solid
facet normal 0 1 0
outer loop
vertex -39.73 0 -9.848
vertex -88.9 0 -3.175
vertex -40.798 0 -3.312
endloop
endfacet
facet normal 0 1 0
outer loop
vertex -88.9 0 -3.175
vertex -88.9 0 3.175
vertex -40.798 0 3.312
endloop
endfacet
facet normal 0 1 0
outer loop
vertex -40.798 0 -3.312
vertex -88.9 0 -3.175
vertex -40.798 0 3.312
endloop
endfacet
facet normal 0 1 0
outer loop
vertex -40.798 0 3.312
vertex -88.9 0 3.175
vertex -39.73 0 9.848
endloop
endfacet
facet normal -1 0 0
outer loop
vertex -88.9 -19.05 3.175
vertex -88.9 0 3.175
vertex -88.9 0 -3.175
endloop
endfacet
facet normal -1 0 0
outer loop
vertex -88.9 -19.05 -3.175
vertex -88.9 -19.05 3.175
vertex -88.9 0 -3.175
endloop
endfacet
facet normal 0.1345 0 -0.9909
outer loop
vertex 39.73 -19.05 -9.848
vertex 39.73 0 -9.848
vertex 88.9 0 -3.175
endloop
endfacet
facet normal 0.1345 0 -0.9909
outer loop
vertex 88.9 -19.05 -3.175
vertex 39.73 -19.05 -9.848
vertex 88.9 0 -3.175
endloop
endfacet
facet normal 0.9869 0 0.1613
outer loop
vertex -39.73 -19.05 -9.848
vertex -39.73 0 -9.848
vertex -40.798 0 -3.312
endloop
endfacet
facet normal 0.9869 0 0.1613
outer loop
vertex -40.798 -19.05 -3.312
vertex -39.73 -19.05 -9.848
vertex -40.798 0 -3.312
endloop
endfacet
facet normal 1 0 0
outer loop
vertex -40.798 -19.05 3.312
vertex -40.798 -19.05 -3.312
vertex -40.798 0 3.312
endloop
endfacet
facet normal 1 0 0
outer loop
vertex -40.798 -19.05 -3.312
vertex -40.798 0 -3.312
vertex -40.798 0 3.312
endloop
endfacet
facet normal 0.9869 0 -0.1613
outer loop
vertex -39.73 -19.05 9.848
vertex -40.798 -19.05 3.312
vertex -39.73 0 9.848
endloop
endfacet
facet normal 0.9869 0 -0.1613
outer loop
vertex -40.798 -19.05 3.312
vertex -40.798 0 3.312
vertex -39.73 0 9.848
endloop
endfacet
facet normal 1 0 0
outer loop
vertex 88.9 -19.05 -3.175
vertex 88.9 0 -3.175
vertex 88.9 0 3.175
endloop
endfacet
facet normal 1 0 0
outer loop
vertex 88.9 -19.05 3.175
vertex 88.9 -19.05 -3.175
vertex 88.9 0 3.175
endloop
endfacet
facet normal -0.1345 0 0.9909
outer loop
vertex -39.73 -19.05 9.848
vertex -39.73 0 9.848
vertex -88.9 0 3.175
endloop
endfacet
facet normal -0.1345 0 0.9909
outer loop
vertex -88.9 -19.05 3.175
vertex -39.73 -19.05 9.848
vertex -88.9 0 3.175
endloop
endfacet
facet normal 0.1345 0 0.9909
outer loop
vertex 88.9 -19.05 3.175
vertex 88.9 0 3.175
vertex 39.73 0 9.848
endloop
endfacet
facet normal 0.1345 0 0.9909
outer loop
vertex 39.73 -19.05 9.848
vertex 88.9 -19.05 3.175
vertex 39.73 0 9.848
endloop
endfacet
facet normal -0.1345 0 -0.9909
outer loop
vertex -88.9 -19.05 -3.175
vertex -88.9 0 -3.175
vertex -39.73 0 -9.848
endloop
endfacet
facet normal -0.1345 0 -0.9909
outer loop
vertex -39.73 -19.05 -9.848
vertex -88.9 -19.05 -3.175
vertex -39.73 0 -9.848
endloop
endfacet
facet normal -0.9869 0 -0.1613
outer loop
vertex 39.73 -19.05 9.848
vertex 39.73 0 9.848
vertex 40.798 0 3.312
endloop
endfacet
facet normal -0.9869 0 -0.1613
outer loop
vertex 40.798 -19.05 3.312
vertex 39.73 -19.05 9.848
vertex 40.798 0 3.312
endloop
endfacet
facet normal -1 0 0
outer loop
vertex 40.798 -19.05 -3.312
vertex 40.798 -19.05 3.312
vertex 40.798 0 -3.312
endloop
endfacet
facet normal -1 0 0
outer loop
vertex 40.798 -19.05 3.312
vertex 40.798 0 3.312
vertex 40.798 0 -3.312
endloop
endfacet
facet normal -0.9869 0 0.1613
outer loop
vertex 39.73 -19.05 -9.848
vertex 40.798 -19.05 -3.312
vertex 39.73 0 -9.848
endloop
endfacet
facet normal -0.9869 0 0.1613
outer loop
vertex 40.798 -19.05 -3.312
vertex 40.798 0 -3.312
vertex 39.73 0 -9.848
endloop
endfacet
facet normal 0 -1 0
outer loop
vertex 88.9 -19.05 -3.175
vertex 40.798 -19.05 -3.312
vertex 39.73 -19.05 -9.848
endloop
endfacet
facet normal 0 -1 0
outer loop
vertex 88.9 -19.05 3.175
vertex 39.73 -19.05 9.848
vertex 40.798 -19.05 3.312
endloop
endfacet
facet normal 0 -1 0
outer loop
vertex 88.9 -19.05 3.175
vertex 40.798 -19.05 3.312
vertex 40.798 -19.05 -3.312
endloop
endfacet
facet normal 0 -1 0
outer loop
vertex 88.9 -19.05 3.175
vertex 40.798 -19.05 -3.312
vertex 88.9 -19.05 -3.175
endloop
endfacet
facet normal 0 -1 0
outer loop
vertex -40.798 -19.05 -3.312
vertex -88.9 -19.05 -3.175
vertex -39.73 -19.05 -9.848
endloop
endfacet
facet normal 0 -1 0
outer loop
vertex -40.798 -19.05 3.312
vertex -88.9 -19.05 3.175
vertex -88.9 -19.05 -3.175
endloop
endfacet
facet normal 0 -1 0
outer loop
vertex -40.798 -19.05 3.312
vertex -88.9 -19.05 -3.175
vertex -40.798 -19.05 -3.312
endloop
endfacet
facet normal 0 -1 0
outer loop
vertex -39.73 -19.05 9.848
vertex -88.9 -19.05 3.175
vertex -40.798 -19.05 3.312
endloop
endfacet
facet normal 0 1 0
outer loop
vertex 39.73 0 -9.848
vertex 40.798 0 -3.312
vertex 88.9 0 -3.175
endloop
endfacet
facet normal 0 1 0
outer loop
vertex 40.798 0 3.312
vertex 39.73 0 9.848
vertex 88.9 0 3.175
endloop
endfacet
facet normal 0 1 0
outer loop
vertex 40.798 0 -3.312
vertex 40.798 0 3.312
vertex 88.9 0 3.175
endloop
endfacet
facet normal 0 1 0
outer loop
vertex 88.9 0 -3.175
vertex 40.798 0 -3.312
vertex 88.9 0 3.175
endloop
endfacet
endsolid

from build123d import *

# Parameters (mm, degrees)
F1_DEPTH = 19.05


with BuildPart() as f1:
    # F0 (on Front) → F1 (new body)
    with BuildSketch(Plane.XZ):
        with BuildLine():
            ThreePointArc((-39.729732, -9.848108), (-40.9321, 0), (-39.729732, 9.848108))
            Line((-39.729732, 9.848108), (-88.9, 3.175))
            Line((-88.9, 3.175), (-88.9, -3.175))
            Line((-88.9, -3.175), (-39.729732, -9.848108))
        make_face()
        with BuildLine():
            Line((39.729732, -9.848108), (88.9, -3.175))
            Line((88.9, -3.175), (88.9, 3.175))
            Line((88.9, 3.175), (39.729732, 9.848108))
            ThreePointArc((39.729732, 9.848108), (40.9321, 0), (39.729732, -9.848108))
        make_face()
    extrude(amount=F1_DEPTH)


solid = f1.part
